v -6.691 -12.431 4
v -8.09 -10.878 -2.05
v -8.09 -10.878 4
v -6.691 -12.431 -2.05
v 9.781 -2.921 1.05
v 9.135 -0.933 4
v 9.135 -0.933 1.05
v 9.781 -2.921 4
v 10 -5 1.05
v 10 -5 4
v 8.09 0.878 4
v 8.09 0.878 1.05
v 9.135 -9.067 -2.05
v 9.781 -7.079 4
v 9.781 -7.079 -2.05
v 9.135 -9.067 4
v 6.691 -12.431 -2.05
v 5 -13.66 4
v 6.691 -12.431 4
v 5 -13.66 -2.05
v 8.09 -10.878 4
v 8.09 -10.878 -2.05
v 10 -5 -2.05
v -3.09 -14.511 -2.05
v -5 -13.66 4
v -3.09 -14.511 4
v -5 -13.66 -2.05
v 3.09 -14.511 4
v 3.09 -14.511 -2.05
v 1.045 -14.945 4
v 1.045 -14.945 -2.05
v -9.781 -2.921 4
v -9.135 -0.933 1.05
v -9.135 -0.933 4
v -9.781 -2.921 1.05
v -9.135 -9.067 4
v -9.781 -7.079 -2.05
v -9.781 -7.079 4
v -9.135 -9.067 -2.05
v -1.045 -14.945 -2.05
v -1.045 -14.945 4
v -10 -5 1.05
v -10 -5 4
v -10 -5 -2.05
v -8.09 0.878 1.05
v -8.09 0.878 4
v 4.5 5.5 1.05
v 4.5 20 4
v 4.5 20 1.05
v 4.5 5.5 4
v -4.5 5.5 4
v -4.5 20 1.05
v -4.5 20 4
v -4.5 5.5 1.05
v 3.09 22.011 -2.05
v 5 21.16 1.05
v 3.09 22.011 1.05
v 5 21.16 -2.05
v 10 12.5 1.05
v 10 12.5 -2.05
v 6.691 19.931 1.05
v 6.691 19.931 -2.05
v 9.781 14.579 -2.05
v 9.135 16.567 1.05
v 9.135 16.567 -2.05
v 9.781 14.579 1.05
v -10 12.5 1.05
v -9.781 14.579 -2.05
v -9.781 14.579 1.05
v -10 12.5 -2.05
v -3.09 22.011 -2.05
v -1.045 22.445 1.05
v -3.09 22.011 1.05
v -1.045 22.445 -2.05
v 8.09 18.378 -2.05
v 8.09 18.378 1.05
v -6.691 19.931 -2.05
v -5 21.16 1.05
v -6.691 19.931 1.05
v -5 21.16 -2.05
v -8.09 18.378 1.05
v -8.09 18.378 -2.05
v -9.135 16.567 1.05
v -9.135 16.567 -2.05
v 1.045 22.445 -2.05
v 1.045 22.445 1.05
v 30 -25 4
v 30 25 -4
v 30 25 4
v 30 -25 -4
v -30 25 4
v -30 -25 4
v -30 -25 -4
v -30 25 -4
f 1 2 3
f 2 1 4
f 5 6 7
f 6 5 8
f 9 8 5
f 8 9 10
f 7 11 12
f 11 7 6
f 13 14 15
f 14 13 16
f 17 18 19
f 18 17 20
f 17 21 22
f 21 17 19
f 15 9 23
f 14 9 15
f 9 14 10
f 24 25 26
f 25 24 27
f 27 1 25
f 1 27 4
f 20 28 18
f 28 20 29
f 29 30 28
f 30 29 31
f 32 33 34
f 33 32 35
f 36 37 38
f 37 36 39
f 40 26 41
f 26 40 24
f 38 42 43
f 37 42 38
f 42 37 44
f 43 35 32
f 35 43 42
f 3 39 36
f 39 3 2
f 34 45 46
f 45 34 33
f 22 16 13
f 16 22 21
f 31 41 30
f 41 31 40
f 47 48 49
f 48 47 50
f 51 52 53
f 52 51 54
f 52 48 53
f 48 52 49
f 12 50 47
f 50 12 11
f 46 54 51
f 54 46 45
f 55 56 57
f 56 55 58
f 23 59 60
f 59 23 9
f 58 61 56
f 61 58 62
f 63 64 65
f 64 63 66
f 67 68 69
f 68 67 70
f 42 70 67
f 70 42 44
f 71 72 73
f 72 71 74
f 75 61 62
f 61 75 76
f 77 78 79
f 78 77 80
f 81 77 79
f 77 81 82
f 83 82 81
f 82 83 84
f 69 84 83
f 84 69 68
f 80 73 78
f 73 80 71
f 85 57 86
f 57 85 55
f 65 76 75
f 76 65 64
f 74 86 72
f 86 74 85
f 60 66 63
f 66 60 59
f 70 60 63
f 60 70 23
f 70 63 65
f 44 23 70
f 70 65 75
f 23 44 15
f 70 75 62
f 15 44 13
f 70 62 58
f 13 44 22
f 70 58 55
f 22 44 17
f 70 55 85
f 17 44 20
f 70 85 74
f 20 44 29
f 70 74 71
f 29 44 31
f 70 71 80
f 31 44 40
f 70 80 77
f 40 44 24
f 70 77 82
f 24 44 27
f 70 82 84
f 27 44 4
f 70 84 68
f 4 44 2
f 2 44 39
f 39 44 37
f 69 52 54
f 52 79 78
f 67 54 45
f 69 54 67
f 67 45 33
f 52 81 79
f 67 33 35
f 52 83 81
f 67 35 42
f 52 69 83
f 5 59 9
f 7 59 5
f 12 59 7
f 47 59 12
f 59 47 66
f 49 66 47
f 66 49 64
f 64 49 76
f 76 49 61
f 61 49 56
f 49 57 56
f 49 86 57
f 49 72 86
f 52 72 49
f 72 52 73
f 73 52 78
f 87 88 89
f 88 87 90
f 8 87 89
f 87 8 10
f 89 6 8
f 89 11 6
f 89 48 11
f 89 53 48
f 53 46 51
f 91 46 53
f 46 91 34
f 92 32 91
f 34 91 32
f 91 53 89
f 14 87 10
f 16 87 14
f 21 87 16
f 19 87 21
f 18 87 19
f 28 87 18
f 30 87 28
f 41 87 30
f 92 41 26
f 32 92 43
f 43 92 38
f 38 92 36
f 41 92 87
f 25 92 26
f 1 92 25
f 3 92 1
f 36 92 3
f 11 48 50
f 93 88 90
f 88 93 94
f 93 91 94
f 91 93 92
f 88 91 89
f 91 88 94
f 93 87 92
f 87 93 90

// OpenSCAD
// Keyhole hanging test piece for IKEA pins
// Pin head diameter: 19mm
// This is a test piece to verify the keyhole mechanism works

// Parameters for IKEA pin
pin_head_diameter = 19;      // Wide part of pin
pin_shaft_diameter = 8;      // Estimated shaft diameter (narrower part)
clearance = 1;               // Extra clearance for easy insertion

// Keyhole dimensions
wide_opening = pin_head_diameter + clearance;   // 20mm - for pin head entry/exit
narrow_slot = pin_shaft_diameter + clearance;   // 9mm - for pin shaft to rest in
slot_length = 15;            // Length of narrow slot
material_thickness = 8;      // Total thickness of test piece (3+3+2=8mm for the three layers)

// Test piece dimensions  
test_width = 60;
test_height = 50;  // Increased height to provide more padding at top

module keyhole() {
    layer1_thickness = 3;  // Layer 1: Original keyhole (narrow slot + wide opening)
    layer2_thickness = 3;  // Layer 2: Full pin head width opening  
    layer3_thickness = 2;  // Layer 3: Solid material (pin stop)
    
    // Layer 1: Original keyhole design (top layer) - opening faces positive Z
    translate([0, 0, material_thickness/2]) {
        // Wide circular opening at bottom
        translate([0, -wide_opening/2 + 5, -layer1_thickness/2])
            cylinder(h = layer1_thickness + 0.1, d = wide_opening, center = true);
        
        // Narrow slot extending upward
        translate([0, slot_length/2 + 5, -layer1_thickness/2])
            cube([narrow_slot, slot_length, layer1_thickness + 0.1], center = true);
        
        // Smooth transition between wide and narrow
        hull() {
            translate([0, -wide_opening/2 + 5, -layer1_thickness/2])
                cylinder(h = layer1_thickness + 0.1, d = wide_opening, center = true);
            translate([0, 5, -layer1_thickness/2])
                cube([narrow_slot, 1, layer1_thickness + 0.1], center = true);
        }
    }
    
    // Layer 2: Full pin head width opening (middle layer) - opening faces positive Z
    translate([0, 0, material_thickness/2 - layer1_thickness]) {
        hull() {
            translate([0, -wide_opening/2 + 5, -layer2_thickness/2])
                cylinder(h = layer2_thickness + 0.1, d = wide_opening, center = true);
            translate([0, slot_length/2 + 5, -layer2_thickness/2])
                cylinder(h = layer2_thickness + 0.1, d = wide_opening, center = true);
        }
    }
    
    // Layer 3: No opening - solid material (pin stop) - no cuts for this layer
}

module keyhole_test_piece() {
    difference() {
        // Base test piece
        cube([test_width, test_height, material_thickness], center = true);
        
        // Single keyhole in center for testing
        translate([0, 0, 0])
            keyhole();
        
        // Optional: second keyhole offset for comparison testing
        // translate([25, 0, 0])
        //     keyhole();
    }
}

// Main test piece
keyhole_test_piece();

// Optional: Show pin outline for reference (comment out for printing)
// %translate([0, -5, material_thickness/2 + 2]) {
//     color("red") cylinder(h = 2, d = pin_head_diameter);
//     color("blue") cylinder(h = 8, d = pin_shaft_diameter);
// }
